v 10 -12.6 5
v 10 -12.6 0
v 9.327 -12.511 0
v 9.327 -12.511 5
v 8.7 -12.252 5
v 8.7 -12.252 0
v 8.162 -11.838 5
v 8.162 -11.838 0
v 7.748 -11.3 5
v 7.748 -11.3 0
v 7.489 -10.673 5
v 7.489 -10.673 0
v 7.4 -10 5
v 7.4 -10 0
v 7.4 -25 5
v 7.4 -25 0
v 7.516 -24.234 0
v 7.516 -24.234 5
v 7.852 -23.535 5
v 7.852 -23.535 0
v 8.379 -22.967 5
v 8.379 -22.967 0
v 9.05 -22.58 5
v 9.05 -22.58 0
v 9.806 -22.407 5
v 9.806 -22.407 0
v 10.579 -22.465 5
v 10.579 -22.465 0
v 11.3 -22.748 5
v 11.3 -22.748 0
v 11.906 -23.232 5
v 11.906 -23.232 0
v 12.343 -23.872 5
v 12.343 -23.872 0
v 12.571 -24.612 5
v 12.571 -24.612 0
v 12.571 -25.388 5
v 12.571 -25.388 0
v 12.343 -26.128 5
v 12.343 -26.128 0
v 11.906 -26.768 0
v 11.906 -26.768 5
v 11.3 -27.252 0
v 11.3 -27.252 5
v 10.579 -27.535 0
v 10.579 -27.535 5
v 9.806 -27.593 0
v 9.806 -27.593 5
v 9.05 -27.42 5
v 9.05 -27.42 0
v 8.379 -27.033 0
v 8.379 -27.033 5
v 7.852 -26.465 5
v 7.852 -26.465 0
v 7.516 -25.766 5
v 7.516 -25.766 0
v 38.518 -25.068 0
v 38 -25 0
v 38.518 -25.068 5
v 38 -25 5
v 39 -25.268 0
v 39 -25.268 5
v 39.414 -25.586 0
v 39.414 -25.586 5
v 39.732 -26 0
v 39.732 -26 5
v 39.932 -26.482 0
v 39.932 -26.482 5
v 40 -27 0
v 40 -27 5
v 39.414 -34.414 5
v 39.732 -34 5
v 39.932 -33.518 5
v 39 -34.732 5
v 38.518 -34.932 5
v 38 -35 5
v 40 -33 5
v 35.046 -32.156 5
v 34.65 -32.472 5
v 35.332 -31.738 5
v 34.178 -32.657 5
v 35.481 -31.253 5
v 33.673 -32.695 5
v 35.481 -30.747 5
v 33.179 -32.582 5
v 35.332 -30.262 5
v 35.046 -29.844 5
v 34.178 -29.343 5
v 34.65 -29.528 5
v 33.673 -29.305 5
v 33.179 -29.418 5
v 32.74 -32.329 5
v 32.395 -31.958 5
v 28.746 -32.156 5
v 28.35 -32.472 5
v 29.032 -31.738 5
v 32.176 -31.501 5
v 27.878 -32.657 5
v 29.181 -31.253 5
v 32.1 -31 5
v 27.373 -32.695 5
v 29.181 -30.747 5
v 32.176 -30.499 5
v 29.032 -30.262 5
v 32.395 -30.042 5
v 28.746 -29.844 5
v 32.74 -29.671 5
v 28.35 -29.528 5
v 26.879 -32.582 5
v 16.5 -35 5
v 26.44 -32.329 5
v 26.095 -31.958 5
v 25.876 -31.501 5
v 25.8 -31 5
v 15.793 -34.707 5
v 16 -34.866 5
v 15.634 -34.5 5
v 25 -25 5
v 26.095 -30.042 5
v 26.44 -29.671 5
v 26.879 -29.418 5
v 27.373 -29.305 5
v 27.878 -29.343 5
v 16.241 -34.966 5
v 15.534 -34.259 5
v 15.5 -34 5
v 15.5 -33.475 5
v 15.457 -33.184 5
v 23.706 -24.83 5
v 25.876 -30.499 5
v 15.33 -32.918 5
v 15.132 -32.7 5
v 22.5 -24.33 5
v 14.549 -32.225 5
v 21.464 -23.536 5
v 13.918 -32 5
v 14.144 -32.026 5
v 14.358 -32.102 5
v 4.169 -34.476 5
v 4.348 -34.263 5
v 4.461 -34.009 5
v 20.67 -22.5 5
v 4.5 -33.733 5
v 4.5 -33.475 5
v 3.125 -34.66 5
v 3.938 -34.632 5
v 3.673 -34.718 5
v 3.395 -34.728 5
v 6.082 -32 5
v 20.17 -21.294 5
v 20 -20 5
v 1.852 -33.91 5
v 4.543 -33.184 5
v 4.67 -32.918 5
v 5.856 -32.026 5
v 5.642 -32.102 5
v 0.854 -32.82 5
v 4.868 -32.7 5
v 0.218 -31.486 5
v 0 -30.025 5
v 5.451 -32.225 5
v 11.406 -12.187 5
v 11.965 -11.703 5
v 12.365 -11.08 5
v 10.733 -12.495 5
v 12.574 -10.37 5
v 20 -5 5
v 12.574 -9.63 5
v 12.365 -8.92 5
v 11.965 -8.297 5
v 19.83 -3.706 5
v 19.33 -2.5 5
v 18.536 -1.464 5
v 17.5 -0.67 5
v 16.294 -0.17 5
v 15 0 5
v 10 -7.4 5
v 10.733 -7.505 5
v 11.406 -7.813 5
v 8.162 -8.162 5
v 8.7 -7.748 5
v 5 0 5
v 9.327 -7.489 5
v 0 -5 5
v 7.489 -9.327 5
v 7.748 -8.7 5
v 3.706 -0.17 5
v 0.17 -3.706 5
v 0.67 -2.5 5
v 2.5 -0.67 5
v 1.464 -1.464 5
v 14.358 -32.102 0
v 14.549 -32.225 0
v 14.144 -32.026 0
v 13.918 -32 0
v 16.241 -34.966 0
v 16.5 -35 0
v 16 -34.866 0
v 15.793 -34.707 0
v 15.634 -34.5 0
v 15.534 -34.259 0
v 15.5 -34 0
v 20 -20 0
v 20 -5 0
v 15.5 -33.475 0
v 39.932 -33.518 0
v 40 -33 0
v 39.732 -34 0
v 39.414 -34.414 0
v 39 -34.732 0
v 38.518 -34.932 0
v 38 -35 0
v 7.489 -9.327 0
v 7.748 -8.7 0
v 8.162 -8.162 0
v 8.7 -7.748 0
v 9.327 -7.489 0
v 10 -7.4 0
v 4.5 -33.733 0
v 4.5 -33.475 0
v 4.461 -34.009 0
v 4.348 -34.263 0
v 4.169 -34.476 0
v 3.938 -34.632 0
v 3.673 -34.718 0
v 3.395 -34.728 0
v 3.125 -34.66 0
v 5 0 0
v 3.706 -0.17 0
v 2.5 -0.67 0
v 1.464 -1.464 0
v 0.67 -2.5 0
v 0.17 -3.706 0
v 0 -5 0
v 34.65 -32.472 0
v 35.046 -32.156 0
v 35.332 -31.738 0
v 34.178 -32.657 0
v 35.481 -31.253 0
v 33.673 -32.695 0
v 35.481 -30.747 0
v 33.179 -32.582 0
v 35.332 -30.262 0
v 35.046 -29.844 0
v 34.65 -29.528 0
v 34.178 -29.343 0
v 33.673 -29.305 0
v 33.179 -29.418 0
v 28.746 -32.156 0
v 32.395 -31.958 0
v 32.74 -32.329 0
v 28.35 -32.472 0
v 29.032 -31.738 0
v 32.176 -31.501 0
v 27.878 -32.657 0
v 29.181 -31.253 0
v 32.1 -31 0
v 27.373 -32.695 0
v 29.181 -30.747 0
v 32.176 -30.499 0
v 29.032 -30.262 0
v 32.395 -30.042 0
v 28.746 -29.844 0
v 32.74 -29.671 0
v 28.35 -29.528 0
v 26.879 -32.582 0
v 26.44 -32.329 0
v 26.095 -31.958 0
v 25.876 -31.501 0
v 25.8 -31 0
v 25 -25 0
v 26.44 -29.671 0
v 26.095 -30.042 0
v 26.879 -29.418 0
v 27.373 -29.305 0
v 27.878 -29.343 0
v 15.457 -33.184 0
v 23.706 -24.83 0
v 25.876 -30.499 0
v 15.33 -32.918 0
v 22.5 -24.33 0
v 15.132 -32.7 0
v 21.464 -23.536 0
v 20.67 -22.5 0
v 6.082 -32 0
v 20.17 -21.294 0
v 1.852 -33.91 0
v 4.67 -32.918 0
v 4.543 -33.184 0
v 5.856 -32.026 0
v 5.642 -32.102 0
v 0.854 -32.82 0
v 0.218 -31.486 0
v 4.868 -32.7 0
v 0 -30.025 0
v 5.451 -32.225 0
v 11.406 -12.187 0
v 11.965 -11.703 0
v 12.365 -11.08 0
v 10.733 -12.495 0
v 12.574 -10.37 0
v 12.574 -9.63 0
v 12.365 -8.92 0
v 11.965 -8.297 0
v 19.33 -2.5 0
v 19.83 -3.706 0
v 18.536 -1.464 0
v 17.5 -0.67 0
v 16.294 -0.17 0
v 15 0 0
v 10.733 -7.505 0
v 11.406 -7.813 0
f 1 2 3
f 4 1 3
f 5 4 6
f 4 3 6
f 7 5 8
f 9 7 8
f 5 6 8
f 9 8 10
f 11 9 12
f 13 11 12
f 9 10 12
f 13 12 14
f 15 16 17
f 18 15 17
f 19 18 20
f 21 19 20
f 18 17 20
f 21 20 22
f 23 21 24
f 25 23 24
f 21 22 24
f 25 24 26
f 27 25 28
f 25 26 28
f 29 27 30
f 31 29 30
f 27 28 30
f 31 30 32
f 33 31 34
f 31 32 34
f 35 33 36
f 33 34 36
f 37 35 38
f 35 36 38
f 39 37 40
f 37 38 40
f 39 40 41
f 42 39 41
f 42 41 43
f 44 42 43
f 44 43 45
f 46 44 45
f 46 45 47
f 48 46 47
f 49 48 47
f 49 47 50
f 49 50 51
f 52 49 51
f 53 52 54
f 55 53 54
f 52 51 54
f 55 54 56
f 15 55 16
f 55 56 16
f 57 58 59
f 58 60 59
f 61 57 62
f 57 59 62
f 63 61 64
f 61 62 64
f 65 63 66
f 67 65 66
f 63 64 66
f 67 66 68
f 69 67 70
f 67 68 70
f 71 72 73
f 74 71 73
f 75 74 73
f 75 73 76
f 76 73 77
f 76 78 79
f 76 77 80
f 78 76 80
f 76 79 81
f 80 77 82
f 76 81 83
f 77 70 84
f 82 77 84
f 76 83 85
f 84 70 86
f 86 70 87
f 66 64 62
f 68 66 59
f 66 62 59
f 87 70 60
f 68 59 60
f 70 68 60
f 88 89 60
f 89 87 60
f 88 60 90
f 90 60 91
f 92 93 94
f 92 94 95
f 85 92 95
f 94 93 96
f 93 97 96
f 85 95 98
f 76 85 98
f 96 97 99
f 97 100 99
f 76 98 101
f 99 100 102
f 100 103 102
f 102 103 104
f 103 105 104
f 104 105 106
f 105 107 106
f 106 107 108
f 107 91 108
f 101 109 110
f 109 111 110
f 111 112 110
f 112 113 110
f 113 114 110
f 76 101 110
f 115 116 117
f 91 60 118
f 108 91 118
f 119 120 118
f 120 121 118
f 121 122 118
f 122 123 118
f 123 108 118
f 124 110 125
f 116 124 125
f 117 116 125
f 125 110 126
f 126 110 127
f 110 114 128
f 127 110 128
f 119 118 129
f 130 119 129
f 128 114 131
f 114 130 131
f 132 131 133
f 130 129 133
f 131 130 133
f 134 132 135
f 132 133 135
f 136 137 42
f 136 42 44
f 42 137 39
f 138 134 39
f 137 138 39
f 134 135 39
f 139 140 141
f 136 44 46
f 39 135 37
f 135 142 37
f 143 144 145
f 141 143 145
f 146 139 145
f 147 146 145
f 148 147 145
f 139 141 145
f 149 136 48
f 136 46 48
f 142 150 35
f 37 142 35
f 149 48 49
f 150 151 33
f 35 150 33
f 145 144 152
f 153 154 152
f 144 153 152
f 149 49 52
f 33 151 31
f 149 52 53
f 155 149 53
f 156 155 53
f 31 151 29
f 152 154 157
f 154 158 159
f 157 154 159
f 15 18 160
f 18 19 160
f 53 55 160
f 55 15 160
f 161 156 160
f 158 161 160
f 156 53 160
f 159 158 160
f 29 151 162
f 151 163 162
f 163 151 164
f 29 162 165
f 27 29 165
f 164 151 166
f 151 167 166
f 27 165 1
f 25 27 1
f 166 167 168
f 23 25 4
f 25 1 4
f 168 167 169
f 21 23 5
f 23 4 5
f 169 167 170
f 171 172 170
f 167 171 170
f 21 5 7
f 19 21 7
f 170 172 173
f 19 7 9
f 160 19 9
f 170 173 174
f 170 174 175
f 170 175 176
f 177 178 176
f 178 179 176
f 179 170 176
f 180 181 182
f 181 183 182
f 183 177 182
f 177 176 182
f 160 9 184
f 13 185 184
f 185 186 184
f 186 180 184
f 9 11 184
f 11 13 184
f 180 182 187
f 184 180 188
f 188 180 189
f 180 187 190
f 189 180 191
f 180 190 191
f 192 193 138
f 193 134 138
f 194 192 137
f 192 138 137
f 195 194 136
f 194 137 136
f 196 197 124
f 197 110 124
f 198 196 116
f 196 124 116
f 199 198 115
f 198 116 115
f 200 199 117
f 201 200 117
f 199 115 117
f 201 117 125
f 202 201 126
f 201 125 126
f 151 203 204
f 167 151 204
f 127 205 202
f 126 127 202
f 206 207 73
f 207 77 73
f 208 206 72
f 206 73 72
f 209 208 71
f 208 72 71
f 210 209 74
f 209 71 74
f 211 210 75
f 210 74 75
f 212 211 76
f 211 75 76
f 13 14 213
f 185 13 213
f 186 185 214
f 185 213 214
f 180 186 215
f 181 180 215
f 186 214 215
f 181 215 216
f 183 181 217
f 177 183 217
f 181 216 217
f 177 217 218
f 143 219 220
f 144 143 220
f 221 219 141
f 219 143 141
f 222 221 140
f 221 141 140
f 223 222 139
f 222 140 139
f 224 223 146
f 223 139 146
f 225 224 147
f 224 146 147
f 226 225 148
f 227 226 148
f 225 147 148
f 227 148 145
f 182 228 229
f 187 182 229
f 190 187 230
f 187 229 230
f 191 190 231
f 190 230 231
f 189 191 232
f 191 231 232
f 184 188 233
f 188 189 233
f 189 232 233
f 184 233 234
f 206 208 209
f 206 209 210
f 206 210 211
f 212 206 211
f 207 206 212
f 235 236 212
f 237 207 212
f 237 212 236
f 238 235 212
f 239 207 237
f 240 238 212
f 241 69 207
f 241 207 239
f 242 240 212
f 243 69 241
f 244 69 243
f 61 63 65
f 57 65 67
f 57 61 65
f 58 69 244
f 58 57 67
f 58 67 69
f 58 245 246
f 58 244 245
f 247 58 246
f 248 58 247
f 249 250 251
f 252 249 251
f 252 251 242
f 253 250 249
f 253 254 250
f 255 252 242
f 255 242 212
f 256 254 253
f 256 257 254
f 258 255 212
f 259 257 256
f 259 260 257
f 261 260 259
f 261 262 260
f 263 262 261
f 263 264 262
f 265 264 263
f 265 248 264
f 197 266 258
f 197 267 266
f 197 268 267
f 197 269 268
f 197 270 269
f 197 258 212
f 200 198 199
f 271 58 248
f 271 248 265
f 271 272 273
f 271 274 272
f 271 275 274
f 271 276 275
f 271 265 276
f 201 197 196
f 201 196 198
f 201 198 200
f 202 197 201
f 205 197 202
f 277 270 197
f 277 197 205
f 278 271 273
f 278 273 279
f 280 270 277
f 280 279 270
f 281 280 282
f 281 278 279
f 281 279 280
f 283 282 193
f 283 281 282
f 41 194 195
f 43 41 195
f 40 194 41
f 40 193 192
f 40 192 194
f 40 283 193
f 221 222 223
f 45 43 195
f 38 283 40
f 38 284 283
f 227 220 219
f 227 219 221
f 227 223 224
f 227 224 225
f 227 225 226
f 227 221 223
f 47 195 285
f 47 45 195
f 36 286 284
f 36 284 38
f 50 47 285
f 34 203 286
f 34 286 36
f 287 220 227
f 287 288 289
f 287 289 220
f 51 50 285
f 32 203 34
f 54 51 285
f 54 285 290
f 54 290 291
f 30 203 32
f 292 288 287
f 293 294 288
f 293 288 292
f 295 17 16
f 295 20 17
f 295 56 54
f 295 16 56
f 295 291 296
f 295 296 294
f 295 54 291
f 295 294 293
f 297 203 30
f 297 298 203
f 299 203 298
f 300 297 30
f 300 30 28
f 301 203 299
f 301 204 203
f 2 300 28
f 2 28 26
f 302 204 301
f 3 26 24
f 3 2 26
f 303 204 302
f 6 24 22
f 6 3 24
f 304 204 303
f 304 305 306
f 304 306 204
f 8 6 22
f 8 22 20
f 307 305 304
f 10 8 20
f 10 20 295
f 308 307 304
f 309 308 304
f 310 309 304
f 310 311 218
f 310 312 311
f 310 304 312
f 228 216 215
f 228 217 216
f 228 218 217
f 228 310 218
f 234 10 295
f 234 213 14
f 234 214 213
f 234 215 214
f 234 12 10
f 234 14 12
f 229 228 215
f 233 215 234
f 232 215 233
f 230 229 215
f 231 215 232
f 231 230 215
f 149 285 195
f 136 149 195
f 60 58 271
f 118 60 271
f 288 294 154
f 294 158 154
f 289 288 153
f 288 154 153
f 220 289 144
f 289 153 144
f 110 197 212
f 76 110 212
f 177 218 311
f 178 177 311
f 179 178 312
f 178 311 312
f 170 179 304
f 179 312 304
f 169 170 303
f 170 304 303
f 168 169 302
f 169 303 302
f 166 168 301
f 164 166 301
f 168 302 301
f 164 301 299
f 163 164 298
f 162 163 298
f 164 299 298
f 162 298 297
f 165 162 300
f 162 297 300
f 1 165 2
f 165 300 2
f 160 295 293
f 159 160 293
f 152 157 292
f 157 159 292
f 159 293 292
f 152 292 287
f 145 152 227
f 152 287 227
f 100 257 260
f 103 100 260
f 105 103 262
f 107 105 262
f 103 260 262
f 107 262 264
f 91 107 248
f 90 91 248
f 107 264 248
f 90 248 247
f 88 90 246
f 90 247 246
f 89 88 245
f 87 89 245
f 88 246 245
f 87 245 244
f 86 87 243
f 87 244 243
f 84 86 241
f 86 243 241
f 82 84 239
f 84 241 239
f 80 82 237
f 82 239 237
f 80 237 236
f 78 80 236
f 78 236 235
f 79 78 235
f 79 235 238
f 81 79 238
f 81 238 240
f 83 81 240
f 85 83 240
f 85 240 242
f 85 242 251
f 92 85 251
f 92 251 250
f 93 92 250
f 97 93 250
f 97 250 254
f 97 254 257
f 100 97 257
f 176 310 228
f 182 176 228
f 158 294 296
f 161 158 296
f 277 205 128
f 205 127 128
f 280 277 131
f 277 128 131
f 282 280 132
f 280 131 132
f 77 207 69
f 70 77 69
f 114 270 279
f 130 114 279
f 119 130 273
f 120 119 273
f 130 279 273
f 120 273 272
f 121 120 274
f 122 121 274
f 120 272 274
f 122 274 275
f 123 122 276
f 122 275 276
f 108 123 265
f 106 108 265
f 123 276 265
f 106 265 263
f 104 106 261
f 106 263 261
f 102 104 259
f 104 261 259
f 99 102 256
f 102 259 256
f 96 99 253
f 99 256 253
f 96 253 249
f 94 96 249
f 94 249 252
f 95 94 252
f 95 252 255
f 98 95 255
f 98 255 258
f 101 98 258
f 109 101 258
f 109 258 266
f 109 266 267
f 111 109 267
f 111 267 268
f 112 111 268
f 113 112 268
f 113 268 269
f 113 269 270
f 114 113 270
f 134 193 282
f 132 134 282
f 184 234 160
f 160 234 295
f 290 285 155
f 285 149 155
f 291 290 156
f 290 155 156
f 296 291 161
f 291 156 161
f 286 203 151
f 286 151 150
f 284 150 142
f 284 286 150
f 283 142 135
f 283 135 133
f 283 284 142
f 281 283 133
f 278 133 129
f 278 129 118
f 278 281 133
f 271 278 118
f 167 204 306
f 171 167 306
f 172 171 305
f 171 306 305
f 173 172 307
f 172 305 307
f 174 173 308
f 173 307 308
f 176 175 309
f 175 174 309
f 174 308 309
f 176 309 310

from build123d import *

# Parameters (mm, degrees)
BOSS_EXTRUDE1_DEPTH = 5
SKETCH5_R           = 2.6
CUT_EXTRUDE1_DEPTH  = 5
CUT_EXTRUDE2_REACH  = 55.385
SKETCH6_R           = 1.7
CUT_EXTRUDE4_REACH  = 55.385
FILLET4_R           = 1
FILLET1_R           = 5
FILLET2_R           = 2
FILLET5_R           = 1


with BuildPart() as part:
    # Sketch3 → Boss-Extrude1 (new body)
    with BuildSketch(Plane.XY):
        Polygon((20, -35), (40, -35), (40, -25), (20, -25), (20, 0), (0, 0), (0, -35), align=None)
    extrude(amount=BOSS_EXTRUDE1_DEPTH)

    # Sketch5 → Cut-Extrude1 (cut)
    with BuildSketch(Plane(origin=(0, 0, 0), x_dir=(-1, 0, 0), z_dir=(0, 0, -1))):
        with BuildLine():
            ThreePointArc((-7.4, -10), (-8.161522369, -8.161522369), (-10, -7.4))
            Line((-10, -7.4), (-10, -12.6))
            ThreePointArc((-10, -12.6), (-8.161522369, -11.838477631), (-7.4, -10))
        make_face()
        with BuildLine():
            Line((-10, -12.6), (-10, -7.4))
            ThreePointArc((-10, -7.4), (-12.6, -10), (-10, -12.6))
        make_face()
        with Locations((-10, -25)):
            Circle(SKETCH5_R)
    extrude(amount=-CUT_EXTRUDE1_DEPTH, mode=Mode.SUBTRACT)

    # Sketch6 → Cut-Extrude2 (cut, up to next)
    with BuildSketch(Plane(origin=(0, 0, 0), x_dir=(-1, 0, 0), z_dir=(0, 0, -1)), mode=Mode.PRIVATE) as cut_extrude2_sk1:
        with Locations((-27.5, -31)):
            Circle(SKETCH6_R)
    cut_extrude2_tool1 = extrude(cut_extrude2_sk1.sketch, amount=-CUT_EXTRUDE2_REACH, mode=Mode.PRIVATE) & part.part
    # Sketch6 → Cut-Extrude2 (cut, up to next)
    with BuildSketch(Plane(origin=(0, 0, 0), x_dir=(-1, 0, 0), z_dir=(0, 0, -1)), mode=Mode.PRIVATE) as cut_extrude2_sk2:
        with Locations((-33.8, -31)):
            Circle(SKETCH6_R)
    cut_extrude2_tool2 = extrude(cut_extrude2_sk2.sketch, amount=-CUT_EXTRUDE2_REACH, mode=Mode.PRIVATE) & part.part
    add(cut_extrude2_tool1.solids().sort_by_distance((27.5, -31, 0))[0], mode=Mode.SUBTRACT)
    add(cut_extrude2_tool2.solids().sort_by_distance((33.8, -31, 0))[0], mode=Mode.SUBTRACT)

    # Sketch8 → Cut-Extrude4 (cut, up to next)
    with BuildSketch(Plane(origin=(0, 0, 0), x_dir=(-1, 0, 0), z_dir=(0, 0, -1)), mode=Mode.PRIVATE) as cut_extrude4_sk1:
        Polygon((-4.5, -35), (-4.5, -33), (-5.726444717, -32), (-14.273555283, -32), (-15.5, -33), (-15.5, -35), align=None)
    cut_extrude4_tool1 = extrude(cut_extrude4_sk1.sketch, amount=-CUT_EXTRUDE4_REACH, mode=Mode.PRIVATE) & part.part
    add(cut_extrude4_tool1.solids().sort_by_distance((10, -33.545033, 0))[0], mode=Mode.SUBTRACT)

    # Fillet4
    fillet4_edges = [part.edges().sort_by_distance(p)[0] for p in [
        (5.726444717, -32, 2.5),
        (4.5, -33, 2.5),
        (15.5, -35, 2.5),
        (15.5, -33, 2.5),
        (14.273555283, -32, 2.5),
    ]]
    fillet(fillet4_edges, radius=FILLET4_R)

    # Fillet1
    # the kernel refuses this fillet: 5 mm, written as the material it adds along each edge
    with BuildSketch(Plane(origin=(20, -25, 0), x_dir=(1, 0, 0), z_dir=(0, 0, 1))) as fillet1_piece_1:
        with BuildLine():
            CenterArc((FILLET1_R, FILLET1_R), FILLET1_R, 180, 90)
            Line((0, FILLET1_R), (0, 0))
            Line((0, 0), (FILLET1_R, 0))
        make_face()
    extrude(amount=5)
    # the kernel refuses this fillet: 5 mm, written as the material it takes off along each edge
    with BuildSketch(Plane(origin=(0, -35, -12.437342964), x_dir=(0, 1, 0), z_dir=(0, 0, 1))) as fillet1_2_piece_1:
        with BuildLine():
            CenterArc((4.974937186, -5), FILLET1_R, 90, 84.260829523)
            Line((0, -4.5), (0, 0))
            Line((0, 0), (4.974937186, 0))
        make_face()
    extrude(amount=29.874685928, mode=Mode.SUBTRACT)
    with BuildSketch(Plane(origin=(0, 0, -12.5), x_dir=(1, 0, 0), z_dir=(0, 0, 1)), Plane(origin=(20, 0, -12.5), x_dir=(0, -1, 0), z_dir=(0, 0, 1))) as fillet1_2_piece_2:
        with BuildLine():
            CenterArc((FILLET1_R, -FILLET1_R), FILLET1_R, 90, 90)
            Line((0, -FILLET1_R), (0, 0))
            Line((0, 0), (FILLET1_R, 0))
        make_face()
    extrude(amount=30, mode=Mode.SUBTRACT)

    # Fillet2
    fillet2_edges = [part.edges().sort_by_distance(p)[0] for p in [
        (40, -35, 2.5),
        (40, -25, 2.5),
    ]]
    fillet(fillet2_edges, radius=FILLET2_R)

    # Fillet5
    fillet5_edges = [part.edges().sort_by_distance(p)[0] for p in [
        (4.5, -35, 2.5),
    ]]
    fillet(fillet5_edges, radius=FILLET5_R)


solid = part.part
